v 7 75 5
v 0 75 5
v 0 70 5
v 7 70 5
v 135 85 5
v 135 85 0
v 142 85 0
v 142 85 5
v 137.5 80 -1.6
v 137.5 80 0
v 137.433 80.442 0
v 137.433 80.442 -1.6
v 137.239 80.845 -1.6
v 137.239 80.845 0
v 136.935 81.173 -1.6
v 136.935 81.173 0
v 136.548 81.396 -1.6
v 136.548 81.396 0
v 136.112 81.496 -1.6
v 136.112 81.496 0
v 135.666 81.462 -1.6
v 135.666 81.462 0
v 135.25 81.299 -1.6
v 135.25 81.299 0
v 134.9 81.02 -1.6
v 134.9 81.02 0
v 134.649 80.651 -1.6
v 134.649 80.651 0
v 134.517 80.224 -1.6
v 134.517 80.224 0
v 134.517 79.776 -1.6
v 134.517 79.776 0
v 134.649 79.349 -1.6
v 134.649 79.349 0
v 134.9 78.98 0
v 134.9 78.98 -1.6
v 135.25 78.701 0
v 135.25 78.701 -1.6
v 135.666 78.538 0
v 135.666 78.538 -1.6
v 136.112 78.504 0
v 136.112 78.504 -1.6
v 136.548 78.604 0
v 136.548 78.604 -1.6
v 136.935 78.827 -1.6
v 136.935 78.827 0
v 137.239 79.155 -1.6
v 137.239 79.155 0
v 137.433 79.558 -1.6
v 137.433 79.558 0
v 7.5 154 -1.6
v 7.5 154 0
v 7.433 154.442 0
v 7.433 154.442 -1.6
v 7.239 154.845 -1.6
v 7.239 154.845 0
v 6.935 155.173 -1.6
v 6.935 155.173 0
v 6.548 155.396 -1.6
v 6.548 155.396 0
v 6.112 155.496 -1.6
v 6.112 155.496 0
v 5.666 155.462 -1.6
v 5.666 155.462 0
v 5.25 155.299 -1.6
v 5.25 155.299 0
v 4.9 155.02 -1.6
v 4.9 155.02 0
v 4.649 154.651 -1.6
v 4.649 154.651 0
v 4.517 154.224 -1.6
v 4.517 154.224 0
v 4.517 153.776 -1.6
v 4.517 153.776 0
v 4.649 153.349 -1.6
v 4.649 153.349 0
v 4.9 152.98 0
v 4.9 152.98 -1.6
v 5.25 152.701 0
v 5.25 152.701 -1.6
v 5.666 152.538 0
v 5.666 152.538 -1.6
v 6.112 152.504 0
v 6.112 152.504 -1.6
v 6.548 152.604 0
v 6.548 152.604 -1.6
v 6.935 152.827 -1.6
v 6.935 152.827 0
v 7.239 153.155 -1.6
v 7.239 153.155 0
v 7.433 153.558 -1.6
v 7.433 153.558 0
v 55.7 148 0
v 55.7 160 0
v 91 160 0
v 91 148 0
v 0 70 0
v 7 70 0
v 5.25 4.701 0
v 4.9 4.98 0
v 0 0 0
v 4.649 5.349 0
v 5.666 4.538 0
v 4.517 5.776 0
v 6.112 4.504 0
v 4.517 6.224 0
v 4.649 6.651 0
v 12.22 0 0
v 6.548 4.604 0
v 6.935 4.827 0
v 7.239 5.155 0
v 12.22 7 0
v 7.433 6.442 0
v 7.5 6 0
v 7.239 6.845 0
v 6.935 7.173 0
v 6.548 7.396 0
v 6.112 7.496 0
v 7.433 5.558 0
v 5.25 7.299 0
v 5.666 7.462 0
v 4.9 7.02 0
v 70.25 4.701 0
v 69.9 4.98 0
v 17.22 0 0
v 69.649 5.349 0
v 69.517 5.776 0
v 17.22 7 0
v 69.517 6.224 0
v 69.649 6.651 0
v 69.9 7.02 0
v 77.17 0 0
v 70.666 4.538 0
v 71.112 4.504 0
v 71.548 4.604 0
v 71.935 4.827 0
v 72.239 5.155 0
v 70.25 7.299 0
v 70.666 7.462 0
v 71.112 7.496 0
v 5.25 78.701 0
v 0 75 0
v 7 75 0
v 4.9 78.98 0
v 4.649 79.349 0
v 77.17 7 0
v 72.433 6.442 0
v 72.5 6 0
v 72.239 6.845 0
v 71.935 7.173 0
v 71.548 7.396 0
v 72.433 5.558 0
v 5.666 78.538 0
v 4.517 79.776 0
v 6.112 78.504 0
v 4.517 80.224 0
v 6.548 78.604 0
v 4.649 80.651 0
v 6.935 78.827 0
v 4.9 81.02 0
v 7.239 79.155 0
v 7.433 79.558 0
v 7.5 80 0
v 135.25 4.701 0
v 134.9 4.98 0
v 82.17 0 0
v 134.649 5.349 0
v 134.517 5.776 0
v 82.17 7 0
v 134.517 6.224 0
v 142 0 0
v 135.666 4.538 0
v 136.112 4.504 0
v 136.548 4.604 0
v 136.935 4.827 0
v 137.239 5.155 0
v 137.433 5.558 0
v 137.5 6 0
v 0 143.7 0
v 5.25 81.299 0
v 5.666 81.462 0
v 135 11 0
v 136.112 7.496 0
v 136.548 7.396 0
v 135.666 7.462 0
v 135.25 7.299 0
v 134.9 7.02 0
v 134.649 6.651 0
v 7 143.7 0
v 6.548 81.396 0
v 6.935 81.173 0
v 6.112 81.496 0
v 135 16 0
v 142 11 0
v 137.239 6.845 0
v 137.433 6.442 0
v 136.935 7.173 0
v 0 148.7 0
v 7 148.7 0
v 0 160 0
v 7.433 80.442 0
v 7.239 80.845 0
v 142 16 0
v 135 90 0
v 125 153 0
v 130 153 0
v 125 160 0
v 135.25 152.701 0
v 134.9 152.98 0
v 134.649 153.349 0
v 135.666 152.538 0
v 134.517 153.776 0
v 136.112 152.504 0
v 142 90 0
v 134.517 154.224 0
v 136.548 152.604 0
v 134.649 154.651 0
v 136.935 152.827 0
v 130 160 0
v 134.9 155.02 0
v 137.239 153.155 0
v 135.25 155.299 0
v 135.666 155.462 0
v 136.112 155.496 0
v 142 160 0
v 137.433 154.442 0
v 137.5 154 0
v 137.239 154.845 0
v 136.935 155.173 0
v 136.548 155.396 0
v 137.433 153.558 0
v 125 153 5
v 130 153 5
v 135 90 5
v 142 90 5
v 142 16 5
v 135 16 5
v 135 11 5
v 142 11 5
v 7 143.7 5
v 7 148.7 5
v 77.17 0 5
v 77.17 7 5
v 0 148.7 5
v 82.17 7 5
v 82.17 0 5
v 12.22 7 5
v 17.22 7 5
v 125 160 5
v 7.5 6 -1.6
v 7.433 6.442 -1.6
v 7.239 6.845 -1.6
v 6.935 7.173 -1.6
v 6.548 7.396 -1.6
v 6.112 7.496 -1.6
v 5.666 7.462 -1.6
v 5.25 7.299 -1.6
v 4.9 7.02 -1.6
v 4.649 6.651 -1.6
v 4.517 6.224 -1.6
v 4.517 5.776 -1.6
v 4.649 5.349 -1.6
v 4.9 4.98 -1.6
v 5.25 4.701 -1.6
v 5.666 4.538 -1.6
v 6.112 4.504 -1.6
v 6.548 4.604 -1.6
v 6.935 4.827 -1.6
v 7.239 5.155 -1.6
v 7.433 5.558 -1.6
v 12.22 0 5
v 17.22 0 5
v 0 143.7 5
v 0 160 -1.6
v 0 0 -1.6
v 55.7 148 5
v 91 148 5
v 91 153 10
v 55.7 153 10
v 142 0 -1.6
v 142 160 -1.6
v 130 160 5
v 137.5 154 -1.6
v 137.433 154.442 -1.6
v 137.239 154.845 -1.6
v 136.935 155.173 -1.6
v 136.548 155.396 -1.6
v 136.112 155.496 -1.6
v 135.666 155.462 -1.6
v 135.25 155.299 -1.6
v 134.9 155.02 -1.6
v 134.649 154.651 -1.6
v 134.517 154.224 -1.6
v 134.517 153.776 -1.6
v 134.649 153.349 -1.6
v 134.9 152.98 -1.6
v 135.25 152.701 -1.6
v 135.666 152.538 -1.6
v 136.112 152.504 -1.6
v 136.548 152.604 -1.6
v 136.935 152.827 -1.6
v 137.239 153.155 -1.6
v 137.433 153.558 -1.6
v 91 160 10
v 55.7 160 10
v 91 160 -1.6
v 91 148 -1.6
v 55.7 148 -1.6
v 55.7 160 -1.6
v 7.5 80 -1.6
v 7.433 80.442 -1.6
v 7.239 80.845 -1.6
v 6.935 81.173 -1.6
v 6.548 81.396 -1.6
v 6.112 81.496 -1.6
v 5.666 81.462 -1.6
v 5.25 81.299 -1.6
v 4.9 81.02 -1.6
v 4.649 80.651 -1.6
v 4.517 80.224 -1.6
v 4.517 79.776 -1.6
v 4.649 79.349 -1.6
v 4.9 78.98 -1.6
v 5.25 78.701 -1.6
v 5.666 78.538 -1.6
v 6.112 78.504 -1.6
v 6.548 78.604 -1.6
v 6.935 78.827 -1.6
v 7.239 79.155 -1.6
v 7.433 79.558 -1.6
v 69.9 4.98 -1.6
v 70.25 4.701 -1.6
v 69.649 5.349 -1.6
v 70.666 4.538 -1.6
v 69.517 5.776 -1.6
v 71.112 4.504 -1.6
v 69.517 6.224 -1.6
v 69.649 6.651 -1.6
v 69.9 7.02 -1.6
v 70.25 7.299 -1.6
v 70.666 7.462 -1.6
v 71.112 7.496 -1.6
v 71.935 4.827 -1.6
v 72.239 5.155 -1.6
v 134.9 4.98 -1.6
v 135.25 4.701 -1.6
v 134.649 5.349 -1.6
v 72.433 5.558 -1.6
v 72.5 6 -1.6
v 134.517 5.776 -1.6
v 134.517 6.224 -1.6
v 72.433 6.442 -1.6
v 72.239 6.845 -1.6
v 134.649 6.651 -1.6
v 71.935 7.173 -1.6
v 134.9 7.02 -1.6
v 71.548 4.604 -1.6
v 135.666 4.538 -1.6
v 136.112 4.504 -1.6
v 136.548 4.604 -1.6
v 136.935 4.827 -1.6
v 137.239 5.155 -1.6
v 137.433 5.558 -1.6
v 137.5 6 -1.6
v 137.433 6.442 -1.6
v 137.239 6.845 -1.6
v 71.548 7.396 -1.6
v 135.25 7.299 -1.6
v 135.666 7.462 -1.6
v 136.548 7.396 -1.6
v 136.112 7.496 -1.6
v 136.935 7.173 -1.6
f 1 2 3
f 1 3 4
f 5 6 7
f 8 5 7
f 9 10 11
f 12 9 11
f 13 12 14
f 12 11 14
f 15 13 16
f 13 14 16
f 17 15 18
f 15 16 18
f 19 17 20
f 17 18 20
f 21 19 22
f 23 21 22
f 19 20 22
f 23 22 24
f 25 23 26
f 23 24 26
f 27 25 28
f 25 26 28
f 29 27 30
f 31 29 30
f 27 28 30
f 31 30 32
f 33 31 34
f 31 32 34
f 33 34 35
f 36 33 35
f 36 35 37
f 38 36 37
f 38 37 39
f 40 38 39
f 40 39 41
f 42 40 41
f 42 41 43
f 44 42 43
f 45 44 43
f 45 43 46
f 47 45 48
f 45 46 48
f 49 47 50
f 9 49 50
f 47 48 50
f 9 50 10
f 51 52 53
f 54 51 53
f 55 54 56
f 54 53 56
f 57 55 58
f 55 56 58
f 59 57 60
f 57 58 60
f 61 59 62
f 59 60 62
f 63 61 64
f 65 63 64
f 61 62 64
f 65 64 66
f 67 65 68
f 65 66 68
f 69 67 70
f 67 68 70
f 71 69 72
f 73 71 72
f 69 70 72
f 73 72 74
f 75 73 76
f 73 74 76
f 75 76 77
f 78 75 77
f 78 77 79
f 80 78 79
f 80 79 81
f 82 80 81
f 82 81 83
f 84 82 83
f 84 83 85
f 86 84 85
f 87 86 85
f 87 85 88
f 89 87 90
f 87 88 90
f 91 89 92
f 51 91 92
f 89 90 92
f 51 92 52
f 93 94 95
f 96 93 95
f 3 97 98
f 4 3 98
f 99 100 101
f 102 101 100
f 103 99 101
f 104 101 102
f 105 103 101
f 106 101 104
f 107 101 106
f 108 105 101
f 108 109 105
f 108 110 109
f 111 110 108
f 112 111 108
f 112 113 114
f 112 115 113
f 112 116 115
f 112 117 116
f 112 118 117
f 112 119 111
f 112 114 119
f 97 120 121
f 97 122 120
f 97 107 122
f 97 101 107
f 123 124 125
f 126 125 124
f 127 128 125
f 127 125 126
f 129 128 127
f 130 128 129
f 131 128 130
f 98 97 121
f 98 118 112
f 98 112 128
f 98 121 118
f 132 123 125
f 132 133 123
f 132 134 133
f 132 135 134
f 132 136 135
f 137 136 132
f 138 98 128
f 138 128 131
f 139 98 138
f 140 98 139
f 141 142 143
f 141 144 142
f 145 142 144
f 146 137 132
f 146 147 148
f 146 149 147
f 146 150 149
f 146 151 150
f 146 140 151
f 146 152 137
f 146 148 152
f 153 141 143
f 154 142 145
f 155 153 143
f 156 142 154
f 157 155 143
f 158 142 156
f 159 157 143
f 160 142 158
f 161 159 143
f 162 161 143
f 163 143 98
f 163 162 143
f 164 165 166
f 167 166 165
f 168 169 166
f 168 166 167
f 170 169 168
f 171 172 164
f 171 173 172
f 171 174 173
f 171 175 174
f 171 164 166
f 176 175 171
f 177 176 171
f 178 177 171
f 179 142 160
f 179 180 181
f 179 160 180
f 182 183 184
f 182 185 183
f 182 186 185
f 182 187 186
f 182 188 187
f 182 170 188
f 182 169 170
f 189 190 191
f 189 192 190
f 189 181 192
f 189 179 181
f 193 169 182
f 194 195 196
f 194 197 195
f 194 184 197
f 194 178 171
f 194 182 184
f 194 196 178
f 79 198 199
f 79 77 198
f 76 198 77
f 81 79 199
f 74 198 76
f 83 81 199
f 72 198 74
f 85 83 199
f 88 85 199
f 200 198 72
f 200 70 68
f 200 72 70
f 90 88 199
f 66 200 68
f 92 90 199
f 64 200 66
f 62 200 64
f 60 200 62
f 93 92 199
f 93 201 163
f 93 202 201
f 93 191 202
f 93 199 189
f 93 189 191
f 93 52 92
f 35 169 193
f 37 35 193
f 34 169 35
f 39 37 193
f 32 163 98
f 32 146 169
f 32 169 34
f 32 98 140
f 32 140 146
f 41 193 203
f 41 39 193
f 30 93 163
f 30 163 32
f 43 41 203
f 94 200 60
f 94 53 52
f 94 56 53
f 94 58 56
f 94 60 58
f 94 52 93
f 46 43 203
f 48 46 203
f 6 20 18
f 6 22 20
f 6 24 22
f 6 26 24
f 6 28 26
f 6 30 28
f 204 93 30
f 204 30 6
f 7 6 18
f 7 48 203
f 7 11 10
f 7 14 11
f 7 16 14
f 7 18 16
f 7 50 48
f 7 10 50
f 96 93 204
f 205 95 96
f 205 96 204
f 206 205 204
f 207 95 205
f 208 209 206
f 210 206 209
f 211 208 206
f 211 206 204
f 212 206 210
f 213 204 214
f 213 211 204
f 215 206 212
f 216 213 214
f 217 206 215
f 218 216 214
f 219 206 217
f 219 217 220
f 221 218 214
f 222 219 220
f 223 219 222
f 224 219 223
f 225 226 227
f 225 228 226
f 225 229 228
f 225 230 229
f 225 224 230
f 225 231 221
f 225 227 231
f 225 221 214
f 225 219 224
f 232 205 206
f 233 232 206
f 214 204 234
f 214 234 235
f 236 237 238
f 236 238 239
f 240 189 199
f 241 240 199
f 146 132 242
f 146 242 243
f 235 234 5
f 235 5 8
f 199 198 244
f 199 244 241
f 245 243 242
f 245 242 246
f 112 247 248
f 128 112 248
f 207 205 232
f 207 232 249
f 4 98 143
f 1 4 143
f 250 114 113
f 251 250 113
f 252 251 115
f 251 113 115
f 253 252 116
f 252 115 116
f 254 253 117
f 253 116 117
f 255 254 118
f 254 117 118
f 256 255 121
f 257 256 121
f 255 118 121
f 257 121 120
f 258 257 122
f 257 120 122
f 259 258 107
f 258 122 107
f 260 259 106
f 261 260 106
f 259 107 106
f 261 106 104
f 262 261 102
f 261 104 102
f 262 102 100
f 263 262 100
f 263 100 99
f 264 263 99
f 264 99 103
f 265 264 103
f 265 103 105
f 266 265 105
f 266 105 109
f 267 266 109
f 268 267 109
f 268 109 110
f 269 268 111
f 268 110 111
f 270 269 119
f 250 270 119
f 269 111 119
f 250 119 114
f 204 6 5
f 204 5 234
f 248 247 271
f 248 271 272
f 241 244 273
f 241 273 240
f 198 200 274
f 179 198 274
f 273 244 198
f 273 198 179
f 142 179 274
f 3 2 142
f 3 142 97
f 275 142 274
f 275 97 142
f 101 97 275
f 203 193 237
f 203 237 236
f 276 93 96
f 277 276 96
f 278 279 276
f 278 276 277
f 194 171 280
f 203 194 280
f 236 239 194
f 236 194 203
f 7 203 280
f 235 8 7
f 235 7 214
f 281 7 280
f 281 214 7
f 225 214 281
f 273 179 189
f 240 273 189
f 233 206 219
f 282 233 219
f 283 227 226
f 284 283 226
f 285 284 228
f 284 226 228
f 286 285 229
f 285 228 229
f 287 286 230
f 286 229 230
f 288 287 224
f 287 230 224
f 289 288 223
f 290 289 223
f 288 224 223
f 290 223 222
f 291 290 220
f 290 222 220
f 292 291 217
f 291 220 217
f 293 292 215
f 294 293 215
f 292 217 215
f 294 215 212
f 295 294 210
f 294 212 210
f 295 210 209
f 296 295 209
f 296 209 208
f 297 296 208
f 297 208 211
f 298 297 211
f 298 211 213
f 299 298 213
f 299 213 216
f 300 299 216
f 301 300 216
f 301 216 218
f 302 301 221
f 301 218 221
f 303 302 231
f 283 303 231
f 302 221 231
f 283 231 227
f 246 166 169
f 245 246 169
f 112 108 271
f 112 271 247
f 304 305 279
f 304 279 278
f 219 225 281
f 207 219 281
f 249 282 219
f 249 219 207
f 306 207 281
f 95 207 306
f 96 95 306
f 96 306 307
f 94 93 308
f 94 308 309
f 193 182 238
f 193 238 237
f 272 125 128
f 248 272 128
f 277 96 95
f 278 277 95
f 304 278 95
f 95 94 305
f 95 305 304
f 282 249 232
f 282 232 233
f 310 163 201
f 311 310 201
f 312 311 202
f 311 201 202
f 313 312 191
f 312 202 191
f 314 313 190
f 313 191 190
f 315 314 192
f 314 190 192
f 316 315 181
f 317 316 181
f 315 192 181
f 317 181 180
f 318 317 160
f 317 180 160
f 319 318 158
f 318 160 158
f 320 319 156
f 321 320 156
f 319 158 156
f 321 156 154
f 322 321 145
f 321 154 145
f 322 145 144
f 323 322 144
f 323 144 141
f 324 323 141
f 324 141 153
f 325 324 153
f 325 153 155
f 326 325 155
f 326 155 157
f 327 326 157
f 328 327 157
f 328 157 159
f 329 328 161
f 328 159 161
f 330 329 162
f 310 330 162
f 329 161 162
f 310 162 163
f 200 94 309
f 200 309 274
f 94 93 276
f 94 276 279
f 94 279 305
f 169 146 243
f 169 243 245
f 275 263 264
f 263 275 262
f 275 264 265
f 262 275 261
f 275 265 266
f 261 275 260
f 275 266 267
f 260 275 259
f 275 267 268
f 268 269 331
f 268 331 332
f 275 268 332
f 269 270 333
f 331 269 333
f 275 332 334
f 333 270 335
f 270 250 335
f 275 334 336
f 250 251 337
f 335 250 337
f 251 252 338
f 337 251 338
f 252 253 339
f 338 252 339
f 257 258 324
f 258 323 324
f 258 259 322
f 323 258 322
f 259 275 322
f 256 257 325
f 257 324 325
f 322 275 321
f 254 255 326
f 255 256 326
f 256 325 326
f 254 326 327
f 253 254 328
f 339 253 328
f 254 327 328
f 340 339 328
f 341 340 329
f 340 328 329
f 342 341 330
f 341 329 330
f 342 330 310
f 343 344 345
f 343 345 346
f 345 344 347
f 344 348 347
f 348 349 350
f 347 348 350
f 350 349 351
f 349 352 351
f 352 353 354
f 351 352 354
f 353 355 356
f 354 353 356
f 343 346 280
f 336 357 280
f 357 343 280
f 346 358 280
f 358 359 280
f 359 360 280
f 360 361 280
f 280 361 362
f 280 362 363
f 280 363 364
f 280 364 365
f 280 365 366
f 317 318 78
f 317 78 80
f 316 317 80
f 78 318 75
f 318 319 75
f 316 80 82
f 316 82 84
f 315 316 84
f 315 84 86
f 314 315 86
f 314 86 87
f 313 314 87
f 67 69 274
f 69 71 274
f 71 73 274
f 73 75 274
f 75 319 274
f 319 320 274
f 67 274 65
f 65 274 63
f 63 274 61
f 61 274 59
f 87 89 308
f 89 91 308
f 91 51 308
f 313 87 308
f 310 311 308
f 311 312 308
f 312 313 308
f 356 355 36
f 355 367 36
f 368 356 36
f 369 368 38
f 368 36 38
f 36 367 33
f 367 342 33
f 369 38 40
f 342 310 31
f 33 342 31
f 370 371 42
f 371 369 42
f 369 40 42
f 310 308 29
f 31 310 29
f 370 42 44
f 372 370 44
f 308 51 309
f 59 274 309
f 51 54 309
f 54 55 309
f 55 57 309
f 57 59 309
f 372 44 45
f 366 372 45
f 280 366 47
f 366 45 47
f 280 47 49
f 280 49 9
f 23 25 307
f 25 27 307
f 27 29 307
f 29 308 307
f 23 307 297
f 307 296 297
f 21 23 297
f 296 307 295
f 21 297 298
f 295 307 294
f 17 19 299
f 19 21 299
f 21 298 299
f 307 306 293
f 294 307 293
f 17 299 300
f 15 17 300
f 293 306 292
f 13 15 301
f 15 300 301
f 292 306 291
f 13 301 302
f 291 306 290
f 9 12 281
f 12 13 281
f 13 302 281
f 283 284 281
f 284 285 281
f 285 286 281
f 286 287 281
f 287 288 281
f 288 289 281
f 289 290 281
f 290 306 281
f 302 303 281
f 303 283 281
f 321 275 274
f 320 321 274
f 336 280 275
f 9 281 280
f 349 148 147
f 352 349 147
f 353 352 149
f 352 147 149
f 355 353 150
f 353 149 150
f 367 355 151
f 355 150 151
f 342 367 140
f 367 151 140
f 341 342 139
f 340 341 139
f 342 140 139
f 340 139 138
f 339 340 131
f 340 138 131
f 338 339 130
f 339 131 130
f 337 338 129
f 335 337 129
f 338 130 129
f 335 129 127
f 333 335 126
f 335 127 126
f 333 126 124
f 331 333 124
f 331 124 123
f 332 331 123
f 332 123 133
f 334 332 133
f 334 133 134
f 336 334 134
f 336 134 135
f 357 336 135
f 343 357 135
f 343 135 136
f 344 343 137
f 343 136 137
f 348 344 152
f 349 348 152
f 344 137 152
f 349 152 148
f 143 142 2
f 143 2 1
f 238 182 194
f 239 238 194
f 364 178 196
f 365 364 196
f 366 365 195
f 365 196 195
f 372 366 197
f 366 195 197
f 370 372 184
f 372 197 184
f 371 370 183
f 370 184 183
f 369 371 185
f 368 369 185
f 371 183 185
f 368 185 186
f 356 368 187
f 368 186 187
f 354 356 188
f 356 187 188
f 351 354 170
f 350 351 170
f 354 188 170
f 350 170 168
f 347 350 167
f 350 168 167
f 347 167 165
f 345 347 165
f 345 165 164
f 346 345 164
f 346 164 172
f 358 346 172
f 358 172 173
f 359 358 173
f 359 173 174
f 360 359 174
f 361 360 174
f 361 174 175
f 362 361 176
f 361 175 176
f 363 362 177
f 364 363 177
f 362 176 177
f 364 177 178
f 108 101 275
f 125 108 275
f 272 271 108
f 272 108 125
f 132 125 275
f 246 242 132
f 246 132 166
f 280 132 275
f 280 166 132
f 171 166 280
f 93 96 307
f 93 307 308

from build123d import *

# Parameters (mm, degrees)
F0_R     = 1.5
F1_DEPTH = 1.6
F2_W     = 35.3
F2_H     = 12
F3_DEPTH = 10
F4_W     = 7
F4_H     = 5
F4_W_2   = 5
F4_H_2   = 7
F5_DEPTH = 5
F6_SIZE  = 5


with BuildPart() as f1:
    # F0 (on Top) → F1 (new body)
    with BuildSketch(Plane.XY):
        Polygon((0, 160), (0, 0), (142, 0), (142, 160), (91, 160), (91, 148), (55.7, 148), (55.7, 160), align=None)
        with Locations((6, 6)):
            Circle(F0_R, mode=Mode.SUBTRACT)
        with Locations((71, 6)):
            Circle(F0_R, mode=Mode.SUBTRACT)
        with Locations((136, 6)):
            Circle(F0_R, mode=Mode.SUBTRACT)
        with Locations((6, 80)):
            Circle(F0_R, mode=Mode.SUBTRACT)
        with Locations((6, 154)):
            Circle(F0_R, mode=Mode.SUBTRACT)
        with Locations((136, 80)):
            Circle(F0_R, mode=Mode.SUBTRACT)
        with Locations((136, 154)):
            Circle(F0_R, mode=Mode.SUBTRACT)
    extrude(amount=-F1_DEPTH)

    # F4 (on Top) → F5 (join)
    with BuildSketch(Plane.XY):
        with Locations((3.5, 146.2)):
            Rectangle(F4_W, F4_H)
        with Locations((3.5, 72.5)):
            Rectangle(F4_W, F4_H)
        with Locations((127.5, 156.5)):
            Rectangle(F4_W_2, F4_H_2)
        with Locations((138.5, 87.5)):
            Rectangle(F4_W, F4_H)
        with Locations((138.5, 13.5)):
            Rectangle(F4_W, F4_H)
        with Locations((79.67, 3.5)):
            Rectangle(F4_W_2, F4_H_2)
        with Locations((14.72, 3.5)):
            Rectangle(F4_W_2, F4_H_2)
    extrude(amount=F5_DEPTH)


with BuildPart() as f3:
    # F2 (on Top) → F3 (new body)
    with BuildSketch(Plane.XY):
        with Locations((73.35, 154)):
            Rectangle(F2_W, F2_H)
    extrude(amount=F3_DEPTH)

    # F6
    f6_edges = [f3.edges().sort_by_distance(p)[0] for p in [
        (73.35, 148, 10),
    ]]
    chamfer(f6_edges, length=F6_SIZE)


solid = Compound([f1.part, f3.part])
